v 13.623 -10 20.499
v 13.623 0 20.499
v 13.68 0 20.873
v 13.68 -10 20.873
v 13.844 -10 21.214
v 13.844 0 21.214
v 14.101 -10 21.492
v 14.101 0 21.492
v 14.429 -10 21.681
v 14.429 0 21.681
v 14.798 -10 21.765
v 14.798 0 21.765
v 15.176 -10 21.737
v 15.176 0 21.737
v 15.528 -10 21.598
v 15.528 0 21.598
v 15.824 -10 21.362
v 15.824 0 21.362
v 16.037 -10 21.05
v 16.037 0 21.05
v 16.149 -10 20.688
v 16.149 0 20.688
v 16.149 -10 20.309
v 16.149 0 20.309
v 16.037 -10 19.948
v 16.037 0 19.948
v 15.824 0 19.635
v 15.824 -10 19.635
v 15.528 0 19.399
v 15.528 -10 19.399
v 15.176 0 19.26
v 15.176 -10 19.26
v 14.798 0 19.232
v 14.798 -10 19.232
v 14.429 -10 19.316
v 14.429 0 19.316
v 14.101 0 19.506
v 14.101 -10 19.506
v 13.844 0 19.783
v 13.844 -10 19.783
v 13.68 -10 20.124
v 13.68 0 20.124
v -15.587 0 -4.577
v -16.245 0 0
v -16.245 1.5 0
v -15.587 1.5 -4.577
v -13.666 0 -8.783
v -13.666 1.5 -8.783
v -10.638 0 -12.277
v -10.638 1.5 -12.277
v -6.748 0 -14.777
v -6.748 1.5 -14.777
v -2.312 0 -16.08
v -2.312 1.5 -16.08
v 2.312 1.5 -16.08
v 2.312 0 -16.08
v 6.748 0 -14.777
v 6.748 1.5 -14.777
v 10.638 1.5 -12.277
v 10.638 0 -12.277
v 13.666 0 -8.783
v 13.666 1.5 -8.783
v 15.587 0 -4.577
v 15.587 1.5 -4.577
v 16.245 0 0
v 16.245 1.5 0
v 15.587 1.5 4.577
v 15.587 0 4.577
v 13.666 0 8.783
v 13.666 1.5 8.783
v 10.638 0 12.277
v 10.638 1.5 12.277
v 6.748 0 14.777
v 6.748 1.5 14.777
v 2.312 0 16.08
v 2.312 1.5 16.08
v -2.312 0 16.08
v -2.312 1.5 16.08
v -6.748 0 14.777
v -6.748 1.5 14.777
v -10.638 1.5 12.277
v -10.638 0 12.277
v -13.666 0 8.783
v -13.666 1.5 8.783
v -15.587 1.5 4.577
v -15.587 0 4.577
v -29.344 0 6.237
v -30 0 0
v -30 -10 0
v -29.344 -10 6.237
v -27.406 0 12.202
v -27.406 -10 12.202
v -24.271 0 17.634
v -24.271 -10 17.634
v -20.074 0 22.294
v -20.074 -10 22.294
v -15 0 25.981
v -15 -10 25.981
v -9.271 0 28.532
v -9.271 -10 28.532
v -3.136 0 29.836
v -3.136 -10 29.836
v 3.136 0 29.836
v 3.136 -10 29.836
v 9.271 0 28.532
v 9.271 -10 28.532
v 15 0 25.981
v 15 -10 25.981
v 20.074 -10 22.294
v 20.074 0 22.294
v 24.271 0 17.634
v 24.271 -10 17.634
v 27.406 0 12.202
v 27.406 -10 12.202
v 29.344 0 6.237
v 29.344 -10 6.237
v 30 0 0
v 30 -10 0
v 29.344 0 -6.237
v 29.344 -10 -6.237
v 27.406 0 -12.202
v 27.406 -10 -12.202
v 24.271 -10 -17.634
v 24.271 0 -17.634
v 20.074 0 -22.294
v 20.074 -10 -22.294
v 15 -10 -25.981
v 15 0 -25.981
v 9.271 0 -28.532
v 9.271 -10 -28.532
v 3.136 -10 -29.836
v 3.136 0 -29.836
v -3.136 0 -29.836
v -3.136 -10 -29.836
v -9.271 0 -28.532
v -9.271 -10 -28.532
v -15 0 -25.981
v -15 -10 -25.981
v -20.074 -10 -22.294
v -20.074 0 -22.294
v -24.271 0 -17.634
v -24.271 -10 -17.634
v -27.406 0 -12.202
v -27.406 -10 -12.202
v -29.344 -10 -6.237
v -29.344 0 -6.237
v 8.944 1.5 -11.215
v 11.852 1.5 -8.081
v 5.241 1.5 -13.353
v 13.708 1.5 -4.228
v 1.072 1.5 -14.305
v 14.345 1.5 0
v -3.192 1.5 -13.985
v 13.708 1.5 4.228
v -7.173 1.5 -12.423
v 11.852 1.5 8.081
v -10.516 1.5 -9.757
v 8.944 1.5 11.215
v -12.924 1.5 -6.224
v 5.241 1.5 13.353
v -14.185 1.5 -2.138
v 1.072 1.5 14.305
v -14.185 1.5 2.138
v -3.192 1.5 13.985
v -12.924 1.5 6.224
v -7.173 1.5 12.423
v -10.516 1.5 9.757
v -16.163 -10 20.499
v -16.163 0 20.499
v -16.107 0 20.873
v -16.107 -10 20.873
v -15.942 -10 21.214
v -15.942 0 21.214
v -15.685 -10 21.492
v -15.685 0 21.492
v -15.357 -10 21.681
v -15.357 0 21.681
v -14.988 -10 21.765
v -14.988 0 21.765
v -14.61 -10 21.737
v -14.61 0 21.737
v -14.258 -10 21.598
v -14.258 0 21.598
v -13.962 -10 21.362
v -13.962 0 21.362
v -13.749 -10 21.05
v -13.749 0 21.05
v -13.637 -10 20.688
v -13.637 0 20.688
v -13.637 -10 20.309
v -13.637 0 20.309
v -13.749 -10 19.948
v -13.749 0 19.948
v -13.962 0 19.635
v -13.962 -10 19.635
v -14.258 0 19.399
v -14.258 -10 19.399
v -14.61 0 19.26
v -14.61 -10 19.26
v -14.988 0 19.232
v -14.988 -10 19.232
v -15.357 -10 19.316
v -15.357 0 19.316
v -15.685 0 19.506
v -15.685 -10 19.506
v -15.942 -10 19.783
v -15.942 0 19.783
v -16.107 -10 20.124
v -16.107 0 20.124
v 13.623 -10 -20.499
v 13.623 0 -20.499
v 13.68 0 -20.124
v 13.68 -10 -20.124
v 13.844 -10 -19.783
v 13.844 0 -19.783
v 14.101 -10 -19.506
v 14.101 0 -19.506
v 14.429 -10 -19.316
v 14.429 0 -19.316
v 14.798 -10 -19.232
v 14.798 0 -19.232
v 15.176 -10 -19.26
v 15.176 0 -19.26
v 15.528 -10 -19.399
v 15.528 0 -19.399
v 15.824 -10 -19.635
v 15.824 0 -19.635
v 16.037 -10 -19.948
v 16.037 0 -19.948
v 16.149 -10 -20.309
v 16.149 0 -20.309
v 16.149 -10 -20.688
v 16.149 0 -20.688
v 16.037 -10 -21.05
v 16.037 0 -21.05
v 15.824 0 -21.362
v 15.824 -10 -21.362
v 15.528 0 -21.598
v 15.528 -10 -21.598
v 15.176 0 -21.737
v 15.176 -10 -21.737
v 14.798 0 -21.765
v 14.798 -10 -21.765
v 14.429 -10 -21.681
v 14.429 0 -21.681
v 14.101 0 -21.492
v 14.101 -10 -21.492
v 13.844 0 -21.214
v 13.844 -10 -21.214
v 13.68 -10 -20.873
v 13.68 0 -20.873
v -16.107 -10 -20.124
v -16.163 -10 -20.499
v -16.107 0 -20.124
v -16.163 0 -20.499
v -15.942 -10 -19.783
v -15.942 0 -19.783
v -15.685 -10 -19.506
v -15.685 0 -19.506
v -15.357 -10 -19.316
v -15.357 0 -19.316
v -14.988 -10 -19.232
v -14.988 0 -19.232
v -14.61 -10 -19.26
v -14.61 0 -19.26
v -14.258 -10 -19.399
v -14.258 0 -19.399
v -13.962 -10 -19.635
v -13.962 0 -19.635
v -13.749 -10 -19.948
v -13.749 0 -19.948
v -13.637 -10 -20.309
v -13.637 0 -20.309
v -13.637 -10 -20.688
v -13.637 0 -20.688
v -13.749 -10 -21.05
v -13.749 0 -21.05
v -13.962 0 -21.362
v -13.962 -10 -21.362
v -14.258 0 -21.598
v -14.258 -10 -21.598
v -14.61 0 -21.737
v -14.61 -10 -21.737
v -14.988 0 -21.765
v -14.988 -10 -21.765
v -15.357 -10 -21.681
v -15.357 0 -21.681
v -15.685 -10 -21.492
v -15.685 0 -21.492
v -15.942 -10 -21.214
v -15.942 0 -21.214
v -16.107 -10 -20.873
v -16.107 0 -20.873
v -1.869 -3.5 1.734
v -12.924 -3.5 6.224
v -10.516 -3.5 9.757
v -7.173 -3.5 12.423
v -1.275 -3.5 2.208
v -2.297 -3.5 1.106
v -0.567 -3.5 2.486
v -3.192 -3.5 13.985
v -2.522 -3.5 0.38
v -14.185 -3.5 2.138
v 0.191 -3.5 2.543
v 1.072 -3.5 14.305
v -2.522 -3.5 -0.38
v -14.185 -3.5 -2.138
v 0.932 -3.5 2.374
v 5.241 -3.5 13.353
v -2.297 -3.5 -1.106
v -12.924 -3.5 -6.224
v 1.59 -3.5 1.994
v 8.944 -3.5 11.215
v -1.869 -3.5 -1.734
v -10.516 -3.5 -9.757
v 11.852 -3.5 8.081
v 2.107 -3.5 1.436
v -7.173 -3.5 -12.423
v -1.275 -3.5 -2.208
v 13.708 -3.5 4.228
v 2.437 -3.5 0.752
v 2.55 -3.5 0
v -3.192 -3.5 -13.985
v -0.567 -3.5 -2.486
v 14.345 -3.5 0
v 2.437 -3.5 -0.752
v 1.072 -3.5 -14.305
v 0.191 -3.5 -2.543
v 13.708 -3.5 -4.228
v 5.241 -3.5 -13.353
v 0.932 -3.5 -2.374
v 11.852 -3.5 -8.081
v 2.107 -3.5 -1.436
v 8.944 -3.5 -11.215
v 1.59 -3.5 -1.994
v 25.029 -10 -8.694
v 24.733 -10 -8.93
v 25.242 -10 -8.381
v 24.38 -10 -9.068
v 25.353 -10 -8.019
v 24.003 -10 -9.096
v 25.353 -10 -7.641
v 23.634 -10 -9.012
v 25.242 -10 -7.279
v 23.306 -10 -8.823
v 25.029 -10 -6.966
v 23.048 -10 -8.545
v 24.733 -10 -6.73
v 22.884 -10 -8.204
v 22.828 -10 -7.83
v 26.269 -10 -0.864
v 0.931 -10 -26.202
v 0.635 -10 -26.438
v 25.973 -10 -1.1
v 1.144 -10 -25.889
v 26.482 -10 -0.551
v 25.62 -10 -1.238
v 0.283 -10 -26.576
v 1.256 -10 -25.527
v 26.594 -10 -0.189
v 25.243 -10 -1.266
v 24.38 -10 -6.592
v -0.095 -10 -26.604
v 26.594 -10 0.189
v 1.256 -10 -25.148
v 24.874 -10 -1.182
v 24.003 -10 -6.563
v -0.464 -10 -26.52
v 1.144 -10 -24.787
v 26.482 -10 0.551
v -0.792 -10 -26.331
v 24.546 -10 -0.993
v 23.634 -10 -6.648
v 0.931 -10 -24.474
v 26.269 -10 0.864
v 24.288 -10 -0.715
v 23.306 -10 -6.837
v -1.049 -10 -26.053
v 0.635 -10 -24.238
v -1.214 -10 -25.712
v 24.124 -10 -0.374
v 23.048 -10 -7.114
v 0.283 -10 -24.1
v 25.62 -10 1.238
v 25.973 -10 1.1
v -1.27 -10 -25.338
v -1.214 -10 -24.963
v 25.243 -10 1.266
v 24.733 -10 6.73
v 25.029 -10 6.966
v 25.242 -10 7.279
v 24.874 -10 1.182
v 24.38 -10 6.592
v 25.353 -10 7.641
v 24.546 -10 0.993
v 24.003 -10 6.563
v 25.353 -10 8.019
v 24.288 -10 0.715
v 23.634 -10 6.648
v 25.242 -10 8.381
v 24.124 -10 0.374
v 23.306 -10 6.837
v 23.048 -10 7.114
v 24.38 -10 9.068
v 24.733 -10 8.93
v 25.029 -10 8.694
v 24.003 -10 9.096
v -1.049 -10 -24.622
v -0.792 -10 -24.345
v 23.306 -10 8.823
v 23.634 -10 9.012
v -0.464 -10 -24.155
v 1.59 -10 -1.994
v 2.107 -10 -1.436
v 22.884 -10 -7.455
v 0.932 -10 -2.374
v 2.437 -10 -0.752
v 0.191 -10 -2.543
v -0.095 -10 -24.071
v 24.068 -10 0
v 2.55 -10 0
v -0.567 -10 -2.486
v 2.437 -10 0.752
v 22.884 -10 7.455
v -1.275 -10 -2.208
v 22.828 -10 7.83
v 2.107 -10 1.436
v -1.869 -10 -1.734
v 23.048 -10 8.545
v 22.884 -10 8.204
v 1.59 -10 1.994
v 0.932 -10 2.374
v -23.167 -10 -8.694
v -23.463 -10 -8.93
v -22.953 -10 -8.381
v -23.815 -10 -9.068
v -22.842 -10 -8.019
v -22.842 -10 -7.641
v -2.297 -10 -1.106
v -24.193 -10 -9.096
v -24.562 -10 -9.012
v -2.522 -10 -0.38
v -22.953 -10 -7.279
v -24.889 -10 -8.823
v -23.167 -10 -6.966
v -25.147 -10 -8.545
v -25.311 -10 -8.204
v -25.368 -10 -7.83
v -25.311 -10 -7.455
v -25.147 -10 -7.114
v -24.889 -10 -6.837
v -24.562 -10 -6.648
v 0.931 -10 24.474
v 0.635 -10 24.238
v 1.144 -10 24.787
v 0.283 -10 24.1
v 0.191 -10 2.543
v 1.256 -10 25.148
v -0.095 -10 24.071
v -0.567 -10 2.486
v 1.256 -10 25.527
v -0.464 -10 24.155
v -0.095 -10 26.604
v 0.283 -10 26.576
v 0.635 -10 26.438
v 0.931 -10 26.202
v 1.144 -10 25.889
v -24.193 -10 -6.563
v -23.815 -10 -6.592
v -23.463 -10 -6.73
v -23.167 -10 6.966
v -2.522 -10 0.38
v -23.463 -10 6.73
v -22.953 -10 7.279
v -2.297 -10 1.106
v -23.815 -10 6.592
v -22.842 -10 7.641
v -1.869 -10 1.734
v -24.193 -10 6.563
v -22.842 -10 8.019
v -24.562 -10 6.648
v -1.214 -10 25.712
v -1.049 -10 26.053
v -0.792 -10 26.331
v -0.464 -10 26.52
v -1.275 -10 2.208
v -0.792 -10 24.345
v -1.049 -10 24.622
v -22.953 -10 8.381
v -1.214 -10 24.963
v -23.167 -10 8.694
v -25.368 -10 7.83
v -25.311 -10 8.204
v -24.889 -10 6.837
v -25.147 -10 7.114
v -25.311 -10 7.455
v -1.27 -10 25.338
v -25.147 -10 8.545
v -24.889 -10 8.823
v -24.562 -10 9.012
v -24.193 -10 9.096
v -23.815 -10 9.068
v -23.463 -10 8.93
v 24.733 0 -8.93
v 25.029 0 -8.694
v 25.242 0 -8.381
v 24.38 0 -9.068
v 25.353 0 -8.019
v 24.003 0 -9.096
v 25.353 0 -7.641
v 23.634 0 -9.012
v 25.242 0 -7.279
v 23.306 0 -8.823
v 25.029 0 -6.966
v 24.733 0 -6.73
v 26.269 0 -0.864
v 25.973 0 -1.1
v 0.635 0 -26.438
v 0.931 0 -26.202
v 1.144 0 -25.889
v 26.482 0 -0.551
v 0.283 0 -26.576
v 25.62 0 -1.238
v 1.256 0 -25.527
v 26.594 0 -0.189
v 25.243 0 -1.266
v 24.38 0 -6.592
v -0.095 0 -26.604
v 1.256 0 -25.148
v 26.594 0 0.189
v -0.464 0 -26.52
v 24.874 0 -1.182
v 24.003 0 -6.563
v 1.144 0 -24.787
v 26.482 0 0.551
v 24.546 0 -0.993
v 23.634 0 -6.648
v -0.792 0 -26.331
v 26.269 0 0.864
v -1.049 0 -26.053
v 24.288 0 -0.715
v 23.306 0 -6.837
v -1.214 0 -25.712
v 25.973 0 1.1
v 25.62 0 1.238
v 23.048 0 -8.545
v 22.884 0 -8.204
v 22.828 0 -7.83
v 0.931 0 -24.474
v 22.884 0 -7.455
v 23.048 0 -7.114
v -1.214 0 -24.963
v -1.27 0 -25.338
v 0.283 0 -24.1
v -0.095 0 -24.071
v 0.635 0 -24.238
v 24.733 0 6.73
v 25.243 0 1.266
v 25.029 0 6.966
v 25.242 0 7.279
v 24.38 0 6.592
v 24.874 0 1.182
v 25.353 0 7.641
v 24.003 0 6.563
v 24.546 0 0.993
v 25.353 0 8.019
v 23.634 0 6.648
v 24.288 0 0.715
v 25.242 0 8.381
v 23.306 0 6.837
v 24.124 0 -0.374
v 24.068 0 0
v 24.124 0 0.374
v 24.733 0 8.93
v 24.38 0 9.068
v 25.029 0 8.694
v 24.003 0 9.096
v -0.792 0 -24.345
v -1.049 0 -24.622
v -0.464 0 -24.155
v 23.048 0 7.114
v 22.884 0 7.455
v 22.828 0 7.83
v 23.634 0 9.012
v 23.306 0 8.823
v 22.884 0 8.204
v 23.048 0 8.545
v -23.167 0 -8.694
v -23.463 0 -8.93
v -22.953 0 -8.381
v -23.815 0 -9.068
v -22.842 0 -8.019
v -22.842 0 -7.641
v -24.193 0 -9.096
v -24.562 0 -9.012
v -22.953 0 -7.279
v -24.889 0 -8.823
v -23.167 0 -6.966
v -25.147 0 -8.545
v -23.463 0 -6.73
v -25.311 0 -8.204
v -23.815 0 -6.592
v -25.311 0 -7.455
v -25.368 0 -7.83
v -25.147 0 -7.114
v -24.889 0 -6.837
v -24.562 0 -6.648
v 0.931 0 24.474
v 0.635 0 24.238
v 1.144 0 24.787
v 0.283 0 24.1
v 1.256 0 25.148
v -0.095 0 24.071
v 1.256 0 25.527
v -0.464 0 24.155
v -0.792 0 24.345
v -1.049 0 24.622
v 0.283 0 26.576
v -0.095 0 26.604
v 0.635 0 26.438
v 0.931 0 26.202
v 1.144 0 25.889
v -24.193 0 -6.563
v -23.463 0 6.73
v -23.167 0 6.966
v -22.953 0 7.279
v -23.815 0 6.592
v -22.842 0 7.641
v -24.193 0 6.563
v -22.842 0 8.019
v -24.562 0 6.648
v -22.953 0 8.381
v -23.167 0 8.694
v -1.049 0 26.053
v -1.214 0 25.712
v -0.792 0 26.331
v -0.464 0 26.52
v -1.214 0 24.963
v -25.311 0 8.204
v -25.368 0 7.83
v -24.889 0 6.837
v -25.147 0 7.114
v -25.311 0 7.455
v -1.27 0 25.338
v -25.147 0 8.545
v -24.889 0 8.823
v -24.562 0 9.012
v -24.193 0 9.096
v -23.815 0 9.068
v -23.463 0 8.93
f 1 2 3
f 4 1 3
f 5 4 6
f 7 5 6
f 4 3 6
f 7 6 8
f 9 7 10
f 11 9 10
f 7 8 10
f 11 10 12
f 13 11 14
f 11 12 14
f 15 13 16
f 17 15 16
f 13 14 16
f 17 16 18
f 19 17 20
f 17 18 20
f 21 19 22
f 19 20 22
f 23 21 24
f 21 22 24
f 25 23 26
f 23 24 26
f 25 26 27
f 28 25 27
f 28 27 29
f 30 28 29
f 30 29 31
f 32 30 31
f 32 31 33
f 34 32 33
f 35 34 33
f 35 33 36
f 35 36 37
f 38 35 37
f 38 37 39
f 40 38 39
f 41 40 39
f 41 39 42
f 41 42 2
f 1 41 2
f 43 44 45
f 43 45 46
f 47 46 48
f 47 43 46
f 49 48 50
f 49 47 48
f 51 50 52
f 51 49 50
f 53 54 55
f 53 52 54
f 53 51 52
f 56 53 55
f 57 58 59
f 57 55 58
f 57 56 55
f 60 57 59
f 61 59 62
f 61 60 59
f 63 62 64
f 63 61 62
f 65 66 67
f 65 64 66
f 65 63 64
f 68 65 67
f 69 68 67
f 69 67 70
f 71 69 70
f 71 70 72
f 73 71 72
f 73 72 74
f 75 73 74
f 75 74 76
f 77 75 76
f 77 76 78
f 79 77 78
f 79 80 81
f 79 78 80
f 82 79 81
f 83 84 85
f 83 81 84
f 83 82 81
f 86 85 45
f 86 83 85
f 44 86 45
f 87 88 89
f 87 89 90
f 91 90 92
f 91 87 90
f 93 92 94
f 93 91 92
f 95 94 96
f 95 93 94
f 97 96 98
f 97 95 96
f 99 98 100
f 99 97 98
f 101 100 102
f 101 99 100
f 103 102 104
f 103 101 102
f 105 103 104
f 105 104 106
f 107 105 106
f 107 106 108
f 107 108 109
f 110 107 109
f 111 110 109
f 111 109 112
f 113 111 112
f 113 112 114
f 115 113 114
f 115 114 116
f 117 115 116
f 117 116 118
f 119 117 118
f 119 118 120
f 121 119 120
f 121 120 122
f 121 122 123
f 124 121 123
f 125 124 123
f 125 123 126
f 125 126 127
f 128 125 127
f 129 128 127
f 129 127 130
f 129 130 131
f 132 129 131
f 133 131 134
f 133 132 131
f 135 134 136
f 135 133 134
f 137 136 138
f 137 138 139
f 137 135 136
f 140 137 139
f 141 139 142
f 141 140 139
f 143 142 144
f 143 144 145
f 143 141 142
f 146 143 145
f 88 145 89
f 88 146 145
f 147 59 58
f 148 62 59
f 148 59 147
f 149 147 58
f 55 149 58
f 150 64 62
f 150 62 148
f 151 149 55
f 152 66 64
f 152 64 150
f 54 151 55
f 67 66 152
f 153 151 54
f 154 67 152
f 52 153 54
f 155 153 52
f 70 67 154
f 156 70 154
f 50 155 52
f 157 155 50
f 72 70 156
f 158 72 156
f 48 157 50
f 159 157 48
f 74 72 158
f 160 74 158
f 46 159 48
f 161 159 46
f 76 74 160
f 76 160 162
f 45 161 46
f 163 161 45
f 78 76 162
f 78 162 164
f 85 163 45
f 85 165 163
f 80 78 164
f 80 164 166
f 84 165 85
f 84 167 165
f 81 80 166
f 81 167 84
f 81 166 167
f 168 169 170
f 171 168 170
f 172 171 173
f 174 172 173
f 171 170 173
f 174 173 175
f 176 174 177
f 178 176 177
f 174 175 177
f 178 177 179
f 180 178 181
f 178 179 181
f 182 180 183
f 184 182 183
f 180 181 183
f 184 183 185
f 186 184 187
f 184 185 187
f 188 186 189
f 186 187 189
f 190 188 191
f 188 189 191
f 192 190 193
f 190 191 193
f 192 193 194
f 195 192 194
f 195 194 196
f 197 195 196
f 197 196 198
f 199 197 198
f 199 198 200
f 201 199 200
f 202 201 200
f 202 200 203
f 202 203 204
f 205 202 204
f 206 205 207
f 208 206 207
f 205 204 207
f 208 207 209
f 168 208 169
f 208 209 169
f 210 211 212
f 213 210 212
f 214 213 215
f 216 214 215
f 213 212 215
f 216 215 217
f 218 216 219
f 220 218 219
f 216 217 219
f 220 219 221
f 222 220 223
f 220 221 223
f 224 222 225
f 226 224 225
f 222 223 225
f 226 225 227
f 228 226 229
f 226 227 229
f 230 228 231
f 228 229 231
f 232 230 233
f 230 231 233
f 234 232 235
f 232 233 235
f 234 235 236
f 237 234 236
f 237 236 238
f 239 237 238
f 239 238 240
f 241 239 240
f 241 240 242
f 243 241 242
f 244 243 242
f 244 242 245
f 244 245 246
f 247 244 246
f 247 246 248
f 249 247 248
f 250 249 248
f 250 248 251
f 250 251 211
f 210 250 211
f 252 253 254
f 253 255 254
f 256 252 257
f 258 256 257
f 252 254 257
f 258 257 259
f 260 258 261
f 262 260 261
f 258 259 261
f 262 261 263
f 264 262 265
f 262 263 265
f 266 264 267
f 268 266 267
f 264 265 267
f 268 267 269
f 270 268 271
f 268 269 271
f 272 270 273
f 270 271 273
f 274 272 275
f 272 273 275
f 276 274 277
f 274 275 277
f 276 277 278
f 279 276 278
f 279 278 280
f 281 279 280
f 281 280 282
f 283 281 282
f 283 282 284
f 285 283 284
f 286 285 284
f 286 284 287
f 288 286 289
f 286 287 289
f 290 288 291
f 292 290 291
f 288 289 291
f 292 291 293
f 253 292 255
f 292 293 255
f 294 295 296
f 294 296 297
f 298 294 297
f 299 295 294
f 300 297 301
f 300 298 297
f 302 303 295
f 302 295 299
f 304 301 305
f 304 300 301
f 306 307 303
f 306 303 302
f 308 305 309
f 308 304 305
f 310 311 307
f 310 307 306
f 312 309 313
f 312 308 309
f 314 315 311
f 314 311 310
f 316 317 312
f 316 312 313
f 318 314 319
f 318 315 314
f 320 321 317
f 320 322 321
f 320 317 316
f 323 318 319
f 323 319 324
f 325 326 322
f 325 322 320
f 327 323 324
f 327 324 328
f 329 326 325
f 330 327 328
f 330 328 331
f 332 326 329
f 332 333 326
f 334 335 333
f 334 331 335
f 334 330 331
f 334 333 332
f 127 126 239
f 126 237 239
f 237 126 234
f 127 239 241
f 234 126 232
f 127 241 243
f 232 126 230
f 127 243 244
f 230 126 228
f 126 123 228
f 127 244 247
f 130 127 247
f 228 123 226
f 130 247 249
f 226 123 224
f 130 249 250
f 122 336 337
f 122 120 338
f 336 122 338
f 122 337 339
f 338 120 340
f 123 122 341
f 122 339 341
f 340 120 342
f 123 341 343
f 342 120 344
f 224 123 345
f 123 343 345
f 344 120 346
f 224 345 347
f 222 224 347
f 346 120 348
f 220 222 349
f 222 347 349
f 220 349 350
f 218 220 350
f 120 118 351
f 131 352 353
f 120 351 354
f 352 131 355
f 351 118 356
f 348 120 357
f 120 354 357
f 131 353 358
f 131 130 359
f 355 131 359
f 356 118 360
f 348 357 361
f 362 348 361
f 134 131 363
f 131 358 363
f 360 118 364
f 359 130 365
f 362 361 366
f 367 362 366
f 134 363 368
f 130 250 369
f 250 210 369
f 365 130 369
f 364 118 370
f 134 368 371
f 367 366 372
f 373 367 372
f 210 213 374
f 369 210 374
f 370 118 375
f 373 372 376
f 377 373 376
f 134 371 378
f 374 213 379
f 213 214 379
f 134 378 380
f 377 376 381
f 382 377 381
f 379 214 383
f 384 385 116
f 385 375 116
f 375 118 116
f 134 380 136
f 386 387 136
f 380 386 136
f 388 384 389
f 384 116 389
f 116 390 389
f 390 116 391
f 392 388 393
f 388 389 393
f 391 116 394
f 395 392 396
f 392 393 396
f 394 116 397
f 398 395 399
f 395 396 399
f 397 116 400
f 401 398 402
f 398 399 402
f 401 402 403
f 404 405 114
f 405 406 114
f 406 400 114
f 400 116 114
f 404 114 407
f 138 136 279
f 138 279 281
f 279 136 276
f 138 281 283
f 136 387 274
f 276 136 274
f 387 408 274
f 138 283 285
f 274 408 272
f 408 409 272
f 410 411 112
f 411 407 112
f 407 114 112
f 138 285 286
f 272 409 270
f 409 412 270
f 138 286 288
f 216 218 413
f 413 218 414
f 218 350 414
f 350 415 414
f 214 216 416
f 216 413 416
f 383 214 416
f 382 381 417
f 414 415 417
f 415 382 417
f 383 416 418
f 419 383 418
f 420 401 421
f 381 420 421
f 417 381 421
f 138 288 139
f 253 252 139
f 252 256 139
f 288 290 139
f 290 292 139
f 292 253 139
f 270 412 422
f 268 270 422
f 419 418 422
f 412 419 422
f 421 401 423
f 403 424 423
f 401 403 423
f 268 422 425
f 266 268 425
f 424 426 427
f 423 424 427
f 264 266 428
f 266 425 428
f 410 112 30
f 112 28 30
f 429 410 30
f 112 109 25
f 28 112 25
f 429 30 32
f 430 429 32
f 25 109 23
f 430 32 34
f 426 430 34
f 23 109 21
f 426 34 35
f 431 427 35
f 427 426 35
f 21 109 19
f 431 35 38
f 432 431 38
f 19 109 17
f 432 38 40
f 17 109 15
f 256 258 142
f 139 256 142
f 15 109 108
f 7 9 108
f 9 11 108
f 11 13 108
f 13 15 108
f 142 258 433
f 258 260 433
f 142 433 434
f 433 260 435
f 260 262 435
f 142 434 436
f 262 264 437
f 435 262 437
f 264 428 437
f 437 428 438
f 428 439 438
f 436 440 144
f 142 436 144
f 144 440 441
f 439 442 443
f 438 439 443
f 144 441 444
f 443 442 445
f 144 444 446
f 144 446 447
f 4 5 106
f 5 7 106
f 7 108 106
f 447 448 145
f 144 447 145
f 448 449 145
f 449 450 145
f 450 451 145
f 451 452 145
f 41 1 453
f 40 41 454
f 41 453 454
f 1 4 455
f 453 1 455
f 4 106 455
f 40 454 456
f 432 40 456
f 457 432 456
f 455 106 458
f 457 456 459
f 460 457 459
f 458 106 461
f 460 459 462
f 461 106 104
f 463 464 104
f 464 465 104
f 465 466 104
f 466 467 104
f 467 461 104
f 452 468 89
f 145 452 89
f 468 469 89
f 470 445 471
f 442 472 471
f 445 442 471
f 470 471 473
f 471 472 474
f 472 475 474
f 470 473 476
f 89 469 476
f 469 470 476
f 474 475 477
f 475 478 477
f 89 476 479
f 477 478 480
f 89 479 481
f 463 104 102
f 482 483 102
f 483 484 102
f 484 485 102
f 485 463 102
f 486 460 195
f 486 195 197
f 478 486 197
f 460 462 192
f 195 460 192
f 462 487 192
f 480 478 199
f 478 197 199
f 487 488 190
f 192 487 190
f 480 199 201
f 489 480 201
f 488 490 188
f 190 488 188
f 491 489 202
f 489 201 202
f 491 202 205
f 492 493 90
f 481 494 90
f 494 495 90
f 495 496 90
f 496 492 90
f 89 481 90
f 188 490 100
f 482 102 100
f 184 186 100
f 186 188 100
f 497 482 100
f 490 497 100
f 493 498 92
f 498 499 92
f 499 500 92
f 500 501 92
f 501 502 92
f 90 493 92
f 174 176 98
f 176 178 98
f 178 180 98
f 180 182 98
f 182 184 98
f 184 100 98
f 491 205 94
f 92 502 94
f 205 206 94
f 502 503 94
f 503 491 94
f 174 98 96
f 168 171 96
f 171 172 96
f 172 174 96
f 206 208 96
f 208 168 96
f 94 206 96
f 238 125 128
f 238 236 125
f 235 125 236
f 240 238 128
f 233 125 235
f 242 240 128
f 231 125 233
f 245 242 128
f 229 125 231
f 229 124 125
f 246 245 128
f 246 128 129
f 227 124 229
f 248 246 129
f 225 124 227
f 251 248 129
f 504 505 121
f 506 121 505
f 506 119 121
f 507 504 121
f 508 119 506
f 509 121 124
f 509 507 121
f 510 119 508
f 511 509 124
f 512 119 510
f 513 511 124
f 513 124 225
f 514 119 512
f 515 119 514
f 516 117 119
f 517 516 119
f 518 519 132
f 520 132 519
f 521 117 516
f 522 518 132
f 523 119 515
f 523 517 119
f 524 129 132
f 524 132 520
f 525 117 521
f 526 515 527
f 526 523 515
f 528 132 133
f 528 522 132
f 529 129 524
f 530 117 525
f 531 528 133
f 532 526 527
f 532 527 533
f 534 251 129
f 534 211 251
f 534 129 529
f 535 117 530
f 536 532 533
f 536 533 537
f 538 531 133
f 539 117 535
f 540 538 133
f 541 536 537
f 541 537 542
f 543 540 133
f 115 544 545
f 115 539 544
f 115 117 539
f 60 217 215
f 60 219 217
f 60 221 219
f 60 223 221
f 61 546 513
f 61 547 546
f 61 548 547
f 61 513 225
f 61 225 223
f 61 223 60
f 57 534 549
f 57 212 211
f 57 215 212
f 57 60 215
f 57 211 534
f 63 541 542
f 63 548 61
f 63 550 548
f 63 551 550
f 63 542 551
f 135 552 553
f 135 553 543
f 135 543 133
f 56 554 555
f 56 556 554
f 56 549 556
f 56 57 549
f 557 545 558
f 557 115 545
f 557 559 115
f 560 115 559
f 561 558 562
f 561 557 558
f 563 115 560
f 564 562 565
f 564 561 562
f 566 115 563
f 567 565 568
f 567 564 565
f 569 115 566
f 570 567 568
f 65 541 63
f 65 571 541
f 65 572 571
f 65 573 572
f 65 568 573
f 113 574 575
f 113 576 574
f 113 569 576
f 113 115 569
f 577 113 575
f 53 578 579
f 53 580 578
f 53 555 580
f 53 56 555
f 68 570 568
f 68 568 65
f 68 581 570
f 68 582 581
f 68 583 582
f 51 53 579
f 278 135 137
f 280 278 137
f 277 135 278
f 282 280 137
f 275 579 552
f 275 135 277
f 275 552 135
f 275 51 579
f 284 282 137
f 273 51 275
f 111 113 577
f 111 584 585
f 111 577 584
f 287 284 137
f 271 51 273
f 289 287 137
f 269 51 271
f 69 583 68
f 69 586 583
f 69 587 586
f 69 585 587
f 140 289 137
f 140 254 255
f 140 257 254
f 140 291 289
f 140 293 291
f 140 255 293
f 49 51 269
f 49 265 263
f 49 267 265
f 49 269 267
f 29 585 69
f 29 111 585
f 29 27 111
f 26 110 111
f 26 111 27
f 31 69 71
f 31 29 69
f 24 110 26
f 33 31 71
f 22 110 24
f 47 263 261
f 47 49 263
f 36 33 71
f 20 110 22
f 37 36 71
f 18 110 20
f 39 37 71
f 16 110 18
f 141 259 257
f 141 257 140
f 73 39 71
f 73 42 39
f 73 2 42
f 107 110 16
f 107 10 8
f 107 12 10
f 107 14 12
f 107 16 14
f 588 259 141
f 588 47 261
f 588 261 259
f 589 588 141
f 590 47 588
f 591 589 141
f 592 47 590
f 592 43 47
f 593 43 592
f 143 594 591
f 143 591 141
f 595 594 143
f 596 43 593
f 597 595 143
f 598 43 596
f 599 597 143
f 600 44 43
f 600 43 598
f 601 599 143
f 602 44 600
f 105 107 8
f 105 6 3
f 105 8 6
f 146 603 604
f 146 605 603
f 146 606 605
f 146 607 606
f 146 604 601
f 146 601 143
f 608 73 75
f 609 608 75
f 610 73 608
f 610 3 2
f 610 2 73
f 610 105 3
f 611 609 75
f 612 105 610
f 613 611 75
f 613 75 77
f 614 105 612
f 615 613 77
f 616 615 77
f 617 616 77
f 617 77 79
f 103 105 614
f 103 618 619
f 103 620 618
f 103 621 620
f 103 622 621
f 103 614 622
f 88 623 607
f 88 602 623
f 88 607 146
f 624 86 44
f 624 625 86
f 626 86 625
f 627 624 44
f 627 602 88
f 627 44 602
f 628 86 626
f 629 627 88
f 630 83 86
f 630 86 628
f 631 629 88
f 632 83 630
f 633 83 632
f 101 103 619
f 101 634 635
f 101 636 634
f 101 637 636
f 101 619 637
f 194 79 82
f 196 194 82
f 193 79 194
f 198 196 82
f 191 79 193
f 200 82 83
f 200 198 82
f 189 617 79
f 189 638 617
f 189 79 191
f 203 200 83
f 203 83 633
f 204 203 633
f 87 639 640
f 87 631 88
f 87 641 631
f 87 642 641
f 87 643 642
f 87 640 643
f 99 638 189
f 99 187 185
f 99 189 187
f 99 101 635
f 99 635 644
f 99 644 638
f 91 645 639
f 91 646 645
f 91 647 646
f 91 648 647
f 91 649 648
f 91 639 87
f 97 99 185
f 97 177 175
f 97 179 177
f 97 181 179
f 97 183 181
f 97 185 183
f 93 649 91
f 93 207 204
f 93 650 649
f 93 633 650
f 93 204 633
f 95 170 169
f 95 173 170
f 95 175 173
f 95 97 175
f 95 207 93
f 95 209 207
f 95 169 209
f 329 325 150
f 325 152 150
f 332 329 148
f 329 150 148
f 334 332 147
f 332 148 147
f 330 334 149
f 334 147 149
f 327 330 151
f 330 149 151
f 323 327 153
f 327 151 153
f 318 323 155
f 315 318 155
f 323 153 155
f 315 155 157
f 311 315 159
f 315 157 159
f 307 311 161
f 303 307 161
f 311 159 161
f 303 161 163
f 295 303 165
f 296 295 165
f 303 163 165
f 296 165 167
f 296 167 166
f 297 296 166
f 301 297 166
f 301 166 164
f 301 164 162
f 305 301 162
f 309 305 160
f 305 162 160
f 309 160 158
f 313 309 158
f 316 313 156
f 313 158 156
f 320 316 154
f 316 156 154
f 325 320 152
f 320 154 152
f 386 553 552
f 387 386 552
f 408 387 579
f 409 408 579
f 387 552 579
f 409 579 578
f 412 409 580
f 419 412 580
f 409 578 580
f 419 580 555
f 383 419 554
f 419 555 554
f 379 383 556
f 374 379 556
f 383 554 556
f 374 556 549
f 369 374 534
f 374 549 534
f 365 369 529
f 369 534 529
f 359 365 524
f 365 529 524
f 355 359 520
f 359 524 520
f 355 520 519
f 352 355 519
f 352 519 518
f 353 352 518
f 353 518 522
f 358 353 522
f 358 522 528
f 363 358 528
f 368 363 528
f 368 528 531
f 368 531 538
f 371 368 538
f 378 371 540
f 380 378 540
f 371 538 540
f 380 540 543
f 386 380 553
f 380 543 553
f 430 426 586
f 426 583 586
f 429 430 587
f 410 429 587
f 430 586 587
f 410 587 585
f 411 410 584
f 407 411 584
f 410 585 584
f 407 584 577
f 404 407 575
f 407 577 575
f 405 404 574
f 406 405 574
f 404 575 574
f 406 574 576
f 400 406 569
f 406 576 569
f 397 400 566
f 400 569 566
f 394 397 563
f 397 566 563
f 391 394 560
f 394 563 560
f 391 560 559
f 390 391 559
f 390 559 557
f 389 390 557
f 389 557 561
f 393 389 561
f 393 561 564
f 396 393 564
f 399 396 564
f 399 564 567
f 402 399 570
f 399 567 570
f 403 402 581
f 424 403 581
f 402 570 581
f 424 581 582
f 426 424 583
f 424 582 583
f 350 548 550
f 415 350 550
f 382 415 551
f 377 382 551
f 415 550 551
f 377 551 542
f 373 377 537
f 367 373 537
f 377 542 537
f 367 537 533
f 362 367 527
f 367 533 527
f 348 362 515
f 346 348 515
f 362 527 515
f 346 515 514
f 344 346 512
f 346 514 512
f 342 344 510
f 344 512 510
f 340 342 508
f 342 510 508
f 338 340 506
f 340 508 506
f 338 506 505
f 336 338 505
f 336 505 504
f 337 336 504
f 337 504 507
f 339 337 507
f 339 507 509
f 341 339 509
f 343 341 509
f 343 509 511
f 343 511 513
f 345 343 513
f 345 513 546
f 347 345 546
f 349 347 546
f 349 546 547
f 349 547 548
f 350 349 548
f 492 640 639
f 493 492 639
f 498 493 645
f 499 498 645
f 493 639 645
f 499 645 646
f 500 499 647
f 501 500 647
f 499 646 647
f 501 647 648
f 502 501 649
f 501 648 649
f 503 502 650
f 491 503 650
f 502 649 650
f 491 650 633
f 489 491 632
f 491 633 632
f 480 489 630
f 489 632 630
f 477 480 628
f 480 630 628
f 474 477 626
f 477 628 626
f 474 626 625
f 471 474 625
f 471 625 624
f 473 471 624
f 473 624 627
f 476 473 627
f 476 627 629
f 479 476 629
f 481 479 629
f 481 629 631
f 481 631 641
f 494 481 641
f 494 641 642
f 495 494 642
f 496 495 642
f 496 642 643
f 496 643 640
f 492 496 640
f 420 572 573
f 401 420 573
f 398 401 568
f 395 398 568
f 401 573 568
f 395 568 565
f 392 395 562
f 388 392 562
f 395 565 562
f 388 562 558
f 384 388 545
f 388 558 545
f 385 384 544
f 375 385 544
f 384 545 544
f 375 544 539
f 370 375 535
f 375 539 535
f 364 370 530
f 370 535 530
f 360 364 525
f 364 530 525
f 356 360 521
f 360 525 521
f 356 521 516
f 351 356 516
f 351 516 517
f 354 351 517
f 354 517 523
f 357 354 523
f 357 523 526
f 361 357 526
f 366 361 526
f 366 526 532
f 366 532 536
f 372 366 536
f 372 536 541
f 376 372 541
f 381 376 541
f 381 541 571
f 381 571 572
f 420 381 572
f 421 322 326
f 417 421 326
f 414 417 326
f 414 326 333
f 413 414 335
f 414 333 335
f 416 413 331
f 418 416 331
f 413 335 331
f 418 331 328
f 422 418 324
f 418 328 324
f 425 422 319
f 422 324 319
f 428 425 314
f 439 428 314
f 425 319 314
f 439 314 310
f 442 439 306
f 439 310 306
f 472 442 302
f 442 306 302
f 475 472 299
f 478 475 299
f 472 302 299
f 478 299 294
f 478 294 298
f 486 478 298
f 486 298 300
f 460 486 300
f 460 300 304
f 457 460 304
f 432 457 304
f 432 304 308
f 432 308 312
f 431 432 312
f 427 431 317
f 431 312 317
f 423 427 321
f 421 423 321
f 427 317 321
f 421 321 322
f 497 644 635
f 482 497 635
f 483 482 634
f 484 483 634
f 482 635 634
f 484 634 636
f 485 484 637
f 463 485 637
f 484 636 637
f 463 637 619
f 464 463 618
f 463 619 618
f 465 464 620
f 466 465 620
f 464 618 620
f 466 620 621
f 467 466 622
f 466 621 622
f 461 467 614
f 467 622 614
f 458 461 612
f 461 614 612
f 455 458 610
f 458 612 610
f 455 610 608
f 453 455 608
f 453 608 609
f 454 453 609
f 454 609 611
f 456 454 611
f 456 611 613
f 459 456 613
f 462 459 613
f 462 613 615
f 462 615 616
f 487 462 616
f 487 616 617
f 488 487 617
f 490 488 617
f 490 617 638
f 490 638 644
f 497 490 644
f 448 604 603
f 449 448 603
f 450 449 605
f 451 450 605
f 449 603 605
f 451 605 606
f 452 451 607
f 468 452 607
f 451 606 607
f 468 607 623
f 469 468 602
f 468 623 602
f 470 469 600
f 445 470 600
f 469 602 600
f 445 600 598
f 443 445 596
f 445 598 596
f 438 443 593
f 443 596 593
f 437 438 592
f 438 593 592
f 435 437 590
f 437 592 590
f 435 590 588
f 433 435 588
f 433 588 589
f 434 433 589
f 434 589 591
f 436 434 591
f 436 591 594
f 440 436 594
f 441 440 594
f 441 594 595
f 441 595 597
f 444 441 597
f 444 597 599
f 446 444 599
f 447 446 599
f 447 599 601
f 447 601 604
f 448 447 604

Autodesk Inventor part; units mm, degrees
ref_plane "YZ Plane" through (0, 0, 0) normal (1, 0, 0) x (0, 1, 0)
ref_plane "XZ Plane" through (0, 0, 0) normal (0, 1, 0) x (-1, 0, 0)
ref_plane "XY Plane" through (0, 0, 0) normal (0, 0, 1) x (1, 0, 0)
sketch "Sketch3" plane through (0, 0, 0) normal (0, 1, 0) x (-1, 0, 0)
  circle A0 centre (0, 0) radius 16.245
  circle A1 centre (0, -25.3377) radius 1.27
  circle A2 centre (-24.0976, -7.8298) radius 1.27
  circle A3 centre (-14.8931, 20.4986) radius 1.27
  circle A4 centre (24.0976, -7.8298) radius 1.27
  circle A5 centre (24.0976, 7.8298) radius 1.27
  circle A6 centre (-24.0976, 7.8298) radius 1.27
  circle A7 centre (-14.8931, -20.4986) radius 1.27
  circle A8 centre (0, 25.3377) radius 1.27
  circle A9 centre (14.8931, -20.4986) radius 1.27
  circle A10 centre (14.8931, 20.4986) radius 1.27
  circle A11 centre (-25.3377, 0) radius 1.27
  circle A12 centre (0, 0) radius 30
  circle A13 centre (0, 0) radius 16.245
  circle A14 centre (0, 0) radius 14.245
extrude "Extrusion4" add sketch "Sketch3" against normal blind 10 contours A0 | A12 | A14
extrude "Extrusion5" add sketch "Sketch3" along normal blind 1.5 contours A0
sketch "Sketch4" plane through (0, 1.5, 0) normal (0, 1, 0) x (1, 0, 0)
  circle A0 centre (0, 0) radius 14.245 projected
  circle A1 centre (0, 0) radius 14.345
  dimension "d16" = 0.1
extrude "Extrusion7" cut sketch "Sketch4" against normal blind 5 contours A0 | A1
sketch "Sketch5" plane through (0, -3.5, 0) normal (0, 1, 0) x (1, 0, 0)
  circle A0 centre (0, 0) radius 2.55
  dimension "d19" = 5.1
extrude "Extrusion8" cut sketch "Sketch5" against normal up to surface (6.5 mm away)
properties part number "top"
